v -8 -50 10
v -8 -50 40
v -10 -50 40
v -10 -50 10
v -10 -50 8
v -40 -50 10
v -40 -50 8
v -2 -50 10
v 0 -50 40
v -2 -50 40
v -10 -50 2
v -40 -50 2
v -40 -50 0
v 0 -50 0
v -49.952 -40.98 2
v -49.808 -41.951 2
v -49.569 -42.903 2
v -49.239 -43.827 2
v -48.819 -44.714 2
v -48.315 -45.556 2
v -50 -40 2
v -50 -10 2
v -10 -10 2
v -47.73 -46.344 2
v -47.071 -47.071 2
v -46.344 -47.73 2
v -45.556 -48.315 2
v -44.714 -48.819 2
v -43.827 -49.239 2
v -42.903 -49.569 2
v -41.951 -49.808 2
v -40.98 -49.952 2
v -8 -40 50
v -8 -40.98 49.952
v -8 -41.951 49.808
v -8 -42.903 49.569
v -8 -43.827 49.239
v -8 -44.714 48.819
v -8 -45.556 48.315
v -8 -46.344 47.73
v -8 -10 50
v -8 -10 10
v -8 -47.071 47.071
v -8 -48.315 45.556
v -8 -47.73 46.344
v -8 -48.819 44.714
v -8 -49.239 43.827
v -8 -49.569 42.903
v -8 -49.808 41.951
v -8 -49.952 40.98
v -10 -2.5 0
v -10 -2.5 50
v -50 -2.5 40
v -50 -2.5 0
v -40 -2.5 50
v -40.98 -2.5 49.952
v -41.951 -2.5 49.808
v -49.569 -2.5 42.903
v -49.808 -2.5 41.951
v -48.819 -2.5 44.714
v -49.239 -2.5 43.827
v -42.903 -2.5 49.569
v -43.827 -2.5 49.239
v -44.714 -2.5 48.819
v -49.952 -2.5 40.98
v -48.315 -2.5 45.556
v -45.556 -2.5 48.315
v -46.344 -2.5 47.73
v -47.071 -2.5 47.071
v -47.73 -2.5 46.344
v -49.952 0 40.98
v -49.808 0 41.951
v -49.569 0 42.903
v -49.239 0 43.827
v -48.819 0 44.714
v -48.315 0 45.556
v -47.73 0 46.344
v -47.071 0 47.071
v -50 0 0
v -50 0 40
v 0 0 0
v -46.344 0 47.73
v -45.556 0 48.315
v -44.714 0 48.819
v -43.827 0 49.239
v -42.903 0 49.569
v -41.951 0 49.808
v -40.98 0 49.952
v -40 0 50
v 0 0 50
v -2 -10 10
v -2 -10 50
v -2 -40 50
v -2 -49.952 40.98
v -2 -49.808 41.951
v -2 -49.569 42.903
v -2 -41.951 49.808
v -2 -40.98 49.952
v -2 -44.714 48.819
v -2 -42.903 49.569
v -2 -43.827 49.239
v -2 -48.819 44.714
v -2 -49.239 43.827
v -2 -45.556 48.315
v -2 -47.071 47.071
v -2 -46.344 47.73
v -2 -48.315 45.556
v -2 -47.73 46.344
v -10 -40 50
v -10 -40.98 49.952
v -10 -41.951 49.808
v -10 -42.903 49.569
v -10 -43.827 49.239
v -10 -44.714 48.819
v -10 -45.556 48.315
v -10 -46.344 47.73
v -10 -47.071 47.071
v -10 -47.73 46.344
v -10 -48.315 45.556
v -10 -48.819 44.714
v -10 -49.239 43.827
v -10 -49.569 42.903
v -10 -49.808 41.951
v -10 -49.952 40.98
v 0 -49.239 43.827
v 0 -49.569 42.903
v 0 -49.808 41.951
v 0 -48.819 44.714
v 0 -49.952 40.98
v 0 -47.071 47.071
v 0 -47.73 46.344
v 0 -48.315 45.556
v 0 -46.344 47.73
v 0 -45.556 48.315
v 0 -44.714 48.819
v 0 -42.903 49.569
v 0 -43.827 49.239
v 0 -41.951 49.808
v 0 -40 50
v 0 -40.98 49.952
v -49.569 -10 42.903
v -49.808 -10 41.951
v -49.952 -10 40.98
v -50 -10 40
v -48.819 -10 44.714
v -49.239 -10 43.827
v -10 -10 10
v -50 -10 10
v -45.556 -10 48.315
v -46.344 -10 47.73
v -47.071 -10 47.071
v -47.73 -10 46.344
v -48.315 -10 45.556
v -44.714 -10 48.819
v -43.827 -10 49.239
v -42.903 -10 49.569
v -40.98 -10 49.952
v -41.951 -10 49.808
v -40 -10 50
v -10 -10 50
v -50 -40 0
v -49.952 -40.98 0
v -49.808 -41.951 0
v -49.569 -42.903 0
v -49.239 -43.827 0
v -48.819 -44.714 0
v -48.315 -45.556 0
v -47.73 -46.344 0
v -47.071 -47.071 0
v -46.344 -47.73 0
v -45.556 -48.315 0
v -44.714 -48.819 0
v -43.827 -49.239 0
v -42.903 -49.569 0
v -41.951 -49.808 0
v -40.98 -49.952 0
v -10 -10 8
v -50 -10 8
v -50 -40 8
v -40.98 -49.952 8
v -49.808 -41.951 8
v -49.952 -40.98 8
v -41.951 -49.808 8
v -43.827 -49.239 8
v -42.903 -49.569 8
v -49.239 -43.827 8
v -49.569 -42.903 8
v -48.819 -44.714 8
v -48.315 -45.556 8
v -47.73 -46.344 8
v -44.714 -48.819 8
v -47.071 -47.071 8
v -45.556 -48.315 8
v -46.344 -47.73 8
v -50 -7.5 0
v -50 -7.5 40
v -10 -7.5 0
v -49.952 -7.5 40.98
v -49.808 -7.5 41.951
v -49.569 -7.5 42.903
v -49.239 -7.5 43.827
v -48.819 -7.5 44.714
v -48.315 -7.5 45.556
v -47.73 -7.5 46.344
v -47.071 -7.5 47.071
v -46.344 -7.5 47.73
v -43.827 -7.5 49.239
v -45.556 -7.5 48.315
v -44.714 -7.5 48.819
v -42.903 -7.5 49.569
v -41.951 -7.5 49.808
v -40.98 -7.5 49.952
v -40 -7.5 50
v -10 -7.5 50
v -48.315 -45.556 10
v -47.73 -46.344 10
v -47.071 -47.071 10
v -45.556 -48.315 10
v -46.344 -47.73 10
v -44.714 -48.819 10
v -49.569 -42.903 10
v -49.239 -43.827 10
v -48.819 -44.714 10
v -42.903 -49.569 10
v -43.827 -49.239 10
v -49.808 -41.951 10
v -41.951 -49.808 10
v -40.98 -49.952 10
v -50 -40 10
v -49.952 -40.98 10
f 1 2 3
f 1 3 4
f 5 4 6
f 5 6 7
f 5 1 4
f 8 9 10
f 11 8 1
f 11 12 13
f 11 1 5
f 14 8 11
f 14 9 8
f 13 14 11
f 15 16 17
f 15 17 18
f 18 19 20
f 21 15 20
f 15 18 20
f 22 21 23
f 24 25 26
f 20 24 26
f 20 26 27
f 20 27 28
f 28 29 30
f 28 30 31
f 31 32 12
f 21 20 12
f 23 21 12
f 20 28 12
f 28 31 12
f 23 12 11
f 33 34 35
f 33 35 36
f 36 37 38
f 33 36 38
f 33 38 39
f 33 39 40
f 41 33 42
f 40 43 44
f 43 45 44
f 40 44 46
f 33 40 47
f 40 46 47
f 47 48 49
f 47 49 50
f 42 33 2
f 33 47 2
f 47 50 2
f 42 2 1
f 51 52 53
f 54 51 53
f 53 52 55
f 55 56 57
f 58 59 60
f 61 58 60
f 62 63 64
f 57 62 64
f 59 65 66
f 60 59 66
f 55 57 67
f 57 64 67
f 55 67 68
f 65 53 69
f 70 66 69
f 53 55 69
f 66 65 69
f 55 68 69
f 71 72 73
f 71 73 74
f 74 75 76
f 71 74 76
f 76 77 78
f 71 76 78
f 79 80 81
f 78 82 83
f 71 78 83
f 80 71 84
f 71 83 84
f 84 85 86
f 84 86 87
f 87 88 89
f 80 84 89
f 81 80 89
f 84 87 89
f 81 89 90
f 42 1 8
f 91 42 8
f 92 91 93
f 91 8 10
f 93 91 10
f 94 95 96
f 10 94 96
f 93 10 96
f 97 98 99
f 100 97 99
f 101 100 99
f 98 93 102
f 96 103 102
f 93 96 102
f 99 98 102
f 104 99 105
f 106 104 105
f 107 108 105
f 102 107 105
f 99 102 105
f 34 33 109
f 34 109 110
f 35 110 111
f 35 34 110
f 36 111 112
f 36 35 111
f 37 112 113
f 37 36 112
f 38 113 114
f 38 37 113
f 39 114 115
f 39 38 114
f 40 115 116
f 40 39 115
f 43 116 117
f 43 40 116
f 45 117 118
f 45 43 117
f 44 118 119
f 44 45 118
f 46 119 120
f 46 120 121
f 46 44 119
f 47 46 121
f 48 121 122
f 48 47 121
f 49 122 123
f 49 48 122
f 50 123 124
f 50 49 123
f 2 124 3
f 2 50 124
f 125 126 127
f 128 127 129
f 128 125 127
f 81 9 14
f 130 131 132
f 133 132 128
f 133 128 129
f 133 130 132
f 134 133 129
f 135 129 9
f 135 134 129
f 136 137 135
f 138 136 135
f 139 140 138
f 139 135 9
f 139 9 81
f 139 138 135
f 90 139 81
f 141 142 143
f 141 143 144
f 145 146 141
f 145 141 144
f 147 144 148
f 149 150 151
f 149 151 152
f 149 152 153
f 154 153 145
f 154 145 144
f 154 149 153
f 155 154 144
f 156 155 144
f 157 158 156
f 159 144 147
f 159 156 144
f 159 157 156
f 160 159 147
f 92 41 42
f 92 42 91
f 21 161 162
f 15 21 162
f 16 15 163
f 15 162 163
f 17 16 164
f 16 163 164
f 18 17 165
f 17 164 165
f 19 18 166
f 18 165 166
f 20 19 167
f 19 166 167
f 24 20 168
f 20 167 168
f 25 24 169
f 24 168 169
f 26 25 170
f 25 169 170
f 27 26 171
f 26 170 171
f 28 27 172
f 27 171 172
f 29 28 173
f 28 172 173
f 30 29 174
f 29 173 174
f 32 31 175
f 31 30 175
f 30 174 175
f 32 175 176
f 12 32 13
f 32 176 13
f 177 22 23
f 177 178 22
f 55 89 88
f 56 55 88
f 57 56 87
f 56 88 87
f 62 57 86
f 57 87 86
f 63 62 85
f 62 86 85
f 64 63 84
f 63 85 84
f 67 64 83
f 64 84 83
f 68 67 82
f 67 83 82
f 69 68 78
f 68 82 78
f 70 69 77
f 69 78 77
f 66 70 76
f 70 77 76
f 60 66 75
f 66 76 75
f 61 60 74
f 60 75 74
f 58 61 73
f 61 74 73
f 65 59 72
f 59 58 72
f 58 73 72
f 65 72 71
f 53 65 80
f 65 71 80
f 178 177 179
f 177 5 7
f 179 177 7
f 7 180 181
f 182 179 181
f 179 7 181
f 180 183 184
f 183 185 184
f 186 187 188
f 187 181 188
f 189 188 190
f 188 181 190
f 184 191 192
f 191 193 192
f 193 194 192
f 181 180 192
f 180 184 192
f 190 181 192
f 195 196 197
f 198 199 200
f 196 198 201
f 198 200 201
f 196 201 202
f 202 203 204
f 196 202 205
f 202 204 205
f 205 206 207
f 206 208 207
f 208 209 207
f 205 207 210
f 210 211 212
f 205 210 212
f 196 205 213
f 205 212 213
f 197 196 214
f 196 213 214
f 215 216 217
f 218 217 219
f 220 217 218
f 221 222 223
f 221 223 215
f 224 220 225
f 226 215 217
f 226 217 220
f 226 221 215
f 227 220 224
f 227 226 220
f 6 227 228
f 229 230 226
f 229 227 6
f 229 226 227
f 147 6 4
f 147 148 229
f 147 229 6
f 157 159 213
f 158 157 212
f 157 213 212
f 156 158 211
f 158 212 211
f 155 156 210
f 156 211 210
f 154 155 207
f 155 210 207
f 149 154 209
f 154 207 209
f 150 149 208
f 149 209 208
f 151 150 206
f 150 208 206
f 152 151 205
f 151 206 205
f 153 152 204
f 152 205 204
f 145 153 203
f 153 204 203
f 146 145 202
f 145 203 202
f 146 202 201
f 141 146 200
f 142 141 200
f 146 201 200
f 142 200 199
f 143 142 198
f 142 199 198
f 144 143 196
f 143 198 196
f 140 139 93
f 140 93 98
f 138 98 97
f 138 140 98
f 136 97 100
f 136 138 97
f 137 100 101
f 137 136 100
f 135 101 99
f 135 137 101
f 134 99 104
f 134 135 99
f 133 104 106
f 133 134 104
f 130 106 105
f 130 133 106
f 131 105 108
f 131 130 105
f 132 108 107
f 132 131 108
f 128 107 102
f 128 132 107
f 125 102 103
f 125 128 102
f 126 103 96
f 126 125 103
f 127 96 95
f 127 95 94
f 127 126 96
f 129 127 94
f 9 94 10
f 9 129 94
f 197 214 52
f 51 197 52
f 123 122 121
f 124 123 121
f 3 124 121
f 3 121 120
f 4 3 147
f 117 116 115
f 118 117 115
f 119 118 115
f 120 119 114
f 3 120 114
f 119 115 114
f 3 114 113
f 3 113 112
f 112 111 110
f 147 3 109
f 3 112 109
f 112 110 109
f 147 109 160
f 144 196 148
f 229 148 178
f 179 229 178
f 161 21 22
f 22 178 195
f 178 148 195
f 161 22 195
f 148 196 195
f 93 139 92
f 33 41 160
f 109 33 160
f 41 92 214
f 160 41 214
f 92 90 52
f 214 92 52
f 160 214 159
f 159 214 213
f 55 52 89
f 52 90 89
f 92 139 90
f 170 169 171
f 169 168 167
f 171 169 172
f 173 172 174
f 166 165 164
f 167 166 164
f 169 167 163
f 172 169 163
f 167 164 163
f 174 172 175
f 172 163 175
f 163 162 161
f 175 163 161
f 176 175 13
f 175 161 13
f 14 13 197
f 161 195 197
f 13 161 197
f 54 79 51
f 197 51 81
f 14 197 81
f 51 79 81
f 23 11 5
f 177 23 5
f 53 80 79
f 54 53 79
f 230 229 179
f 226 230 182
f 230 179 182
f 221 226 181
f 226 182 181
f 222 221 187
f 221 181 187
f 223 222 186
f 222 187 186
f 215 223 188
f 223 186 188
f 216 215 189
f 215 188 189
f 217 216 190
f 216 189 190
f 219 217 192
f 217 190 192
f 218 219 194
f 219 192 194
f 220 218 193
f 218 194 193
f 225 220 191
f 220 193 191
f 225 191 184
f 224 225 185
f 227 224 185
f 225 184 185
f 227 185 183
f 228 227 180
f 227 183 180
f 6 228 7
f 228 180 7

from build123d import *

# Parameters (mm, degrees)
F1_DEPTH = 10
F3_DEPTH = 10
F5_DEPTH = 10
F6_W     = 20
F6_H     = 6
F6_W_2   = 6
F6_H_2   = 30
F6_H_3   = 20
F7_DEPTH = 40
F8_W     = 30
F8_H     = 5
F8_W_2   = 20
F9_DEPTH = 50.001


# Not quite as in the source:
# - a feature names something its author has since deleted; it is built from what else it names


with BuildPart() as f1:
    # F0 (on Top) → F1 (new body)
    with BuildSketch(Plane.XY):
        with BuildLine():
            Line((0, -50), (0, 0))
            Line((0, 0), (-50, 0))
            Line((-50, 0), (-50, -40))
            ThreePointArc((-50, -40), (-47.0710678119, -47.0710678119), (-40, -50))
            Line((-40, -50), (0, -50))
        make_face()
    extrude(amount=F1_DEPTH)

    # F2 (on Right) → F3 (join)
    with BuildSketch(Plane.YZ):
        with BuildLine():
            Line((-50, 10), (0, 10))
            Line((0, 10), (0, 50))
            Line((0, 50), (-40, 50))
            ThreePointArc((-40, 50), (-47.0710678119, 47.0710678119), (-50, 40))
            Line((-50, 40), (-50, 10))
        make_face()
    extrude(amount=-F3_DEPTH)

    # F4 (on Front) → F5 (join)
    with BuildSketch(Plane.XZ):
        with BuildLine():
            Line((-50, 10), (-10, 10))
            Line((-10, 10), (-10, 50))
            Line((-10, 50), (-40, 50))
            ThreePointArc((-40, 50), (-47.0710678119, 47.0710678119), (-50, 40))
            Line((-50, 40), (-50, 10))
        make_face()
    extrude(amount=F5_DEPTH)

    # F6 (on face) → F7 (cut)
    with BuildSketch(Plane.XZ.offset(50)):
        Polygon((-15, 2), (-10, 2), (-10, 8), (-40, 8), (-40, 2), align=None)
        with Locations((-50, 5)):
            Rectangle(F6_W, F6_H)
        with Locations((-5, 25)):
            Rectangle(F6_W_2, F6_H_2)
        with Locations((-5, 50)):
            Rectangle(F6_W_2, F6_H_3)
    extrude(amount=-F7_DEPTH, mode=Mode.SUBTRACT)

    # F8 (on face) → F9 (cut, through all)
    with BuildSketch(Plane.XY.offset(50)):
        with Locations((-25, -5)):
            Rectangle(F8_W, F8_H)
        with Locations((-50, -5)):
            Rectangle(F8_W_2, F8_H)
    extrude(amount=-F9_DEPTH, mode=Mode.SUBTRACT)


solid = f1.part
